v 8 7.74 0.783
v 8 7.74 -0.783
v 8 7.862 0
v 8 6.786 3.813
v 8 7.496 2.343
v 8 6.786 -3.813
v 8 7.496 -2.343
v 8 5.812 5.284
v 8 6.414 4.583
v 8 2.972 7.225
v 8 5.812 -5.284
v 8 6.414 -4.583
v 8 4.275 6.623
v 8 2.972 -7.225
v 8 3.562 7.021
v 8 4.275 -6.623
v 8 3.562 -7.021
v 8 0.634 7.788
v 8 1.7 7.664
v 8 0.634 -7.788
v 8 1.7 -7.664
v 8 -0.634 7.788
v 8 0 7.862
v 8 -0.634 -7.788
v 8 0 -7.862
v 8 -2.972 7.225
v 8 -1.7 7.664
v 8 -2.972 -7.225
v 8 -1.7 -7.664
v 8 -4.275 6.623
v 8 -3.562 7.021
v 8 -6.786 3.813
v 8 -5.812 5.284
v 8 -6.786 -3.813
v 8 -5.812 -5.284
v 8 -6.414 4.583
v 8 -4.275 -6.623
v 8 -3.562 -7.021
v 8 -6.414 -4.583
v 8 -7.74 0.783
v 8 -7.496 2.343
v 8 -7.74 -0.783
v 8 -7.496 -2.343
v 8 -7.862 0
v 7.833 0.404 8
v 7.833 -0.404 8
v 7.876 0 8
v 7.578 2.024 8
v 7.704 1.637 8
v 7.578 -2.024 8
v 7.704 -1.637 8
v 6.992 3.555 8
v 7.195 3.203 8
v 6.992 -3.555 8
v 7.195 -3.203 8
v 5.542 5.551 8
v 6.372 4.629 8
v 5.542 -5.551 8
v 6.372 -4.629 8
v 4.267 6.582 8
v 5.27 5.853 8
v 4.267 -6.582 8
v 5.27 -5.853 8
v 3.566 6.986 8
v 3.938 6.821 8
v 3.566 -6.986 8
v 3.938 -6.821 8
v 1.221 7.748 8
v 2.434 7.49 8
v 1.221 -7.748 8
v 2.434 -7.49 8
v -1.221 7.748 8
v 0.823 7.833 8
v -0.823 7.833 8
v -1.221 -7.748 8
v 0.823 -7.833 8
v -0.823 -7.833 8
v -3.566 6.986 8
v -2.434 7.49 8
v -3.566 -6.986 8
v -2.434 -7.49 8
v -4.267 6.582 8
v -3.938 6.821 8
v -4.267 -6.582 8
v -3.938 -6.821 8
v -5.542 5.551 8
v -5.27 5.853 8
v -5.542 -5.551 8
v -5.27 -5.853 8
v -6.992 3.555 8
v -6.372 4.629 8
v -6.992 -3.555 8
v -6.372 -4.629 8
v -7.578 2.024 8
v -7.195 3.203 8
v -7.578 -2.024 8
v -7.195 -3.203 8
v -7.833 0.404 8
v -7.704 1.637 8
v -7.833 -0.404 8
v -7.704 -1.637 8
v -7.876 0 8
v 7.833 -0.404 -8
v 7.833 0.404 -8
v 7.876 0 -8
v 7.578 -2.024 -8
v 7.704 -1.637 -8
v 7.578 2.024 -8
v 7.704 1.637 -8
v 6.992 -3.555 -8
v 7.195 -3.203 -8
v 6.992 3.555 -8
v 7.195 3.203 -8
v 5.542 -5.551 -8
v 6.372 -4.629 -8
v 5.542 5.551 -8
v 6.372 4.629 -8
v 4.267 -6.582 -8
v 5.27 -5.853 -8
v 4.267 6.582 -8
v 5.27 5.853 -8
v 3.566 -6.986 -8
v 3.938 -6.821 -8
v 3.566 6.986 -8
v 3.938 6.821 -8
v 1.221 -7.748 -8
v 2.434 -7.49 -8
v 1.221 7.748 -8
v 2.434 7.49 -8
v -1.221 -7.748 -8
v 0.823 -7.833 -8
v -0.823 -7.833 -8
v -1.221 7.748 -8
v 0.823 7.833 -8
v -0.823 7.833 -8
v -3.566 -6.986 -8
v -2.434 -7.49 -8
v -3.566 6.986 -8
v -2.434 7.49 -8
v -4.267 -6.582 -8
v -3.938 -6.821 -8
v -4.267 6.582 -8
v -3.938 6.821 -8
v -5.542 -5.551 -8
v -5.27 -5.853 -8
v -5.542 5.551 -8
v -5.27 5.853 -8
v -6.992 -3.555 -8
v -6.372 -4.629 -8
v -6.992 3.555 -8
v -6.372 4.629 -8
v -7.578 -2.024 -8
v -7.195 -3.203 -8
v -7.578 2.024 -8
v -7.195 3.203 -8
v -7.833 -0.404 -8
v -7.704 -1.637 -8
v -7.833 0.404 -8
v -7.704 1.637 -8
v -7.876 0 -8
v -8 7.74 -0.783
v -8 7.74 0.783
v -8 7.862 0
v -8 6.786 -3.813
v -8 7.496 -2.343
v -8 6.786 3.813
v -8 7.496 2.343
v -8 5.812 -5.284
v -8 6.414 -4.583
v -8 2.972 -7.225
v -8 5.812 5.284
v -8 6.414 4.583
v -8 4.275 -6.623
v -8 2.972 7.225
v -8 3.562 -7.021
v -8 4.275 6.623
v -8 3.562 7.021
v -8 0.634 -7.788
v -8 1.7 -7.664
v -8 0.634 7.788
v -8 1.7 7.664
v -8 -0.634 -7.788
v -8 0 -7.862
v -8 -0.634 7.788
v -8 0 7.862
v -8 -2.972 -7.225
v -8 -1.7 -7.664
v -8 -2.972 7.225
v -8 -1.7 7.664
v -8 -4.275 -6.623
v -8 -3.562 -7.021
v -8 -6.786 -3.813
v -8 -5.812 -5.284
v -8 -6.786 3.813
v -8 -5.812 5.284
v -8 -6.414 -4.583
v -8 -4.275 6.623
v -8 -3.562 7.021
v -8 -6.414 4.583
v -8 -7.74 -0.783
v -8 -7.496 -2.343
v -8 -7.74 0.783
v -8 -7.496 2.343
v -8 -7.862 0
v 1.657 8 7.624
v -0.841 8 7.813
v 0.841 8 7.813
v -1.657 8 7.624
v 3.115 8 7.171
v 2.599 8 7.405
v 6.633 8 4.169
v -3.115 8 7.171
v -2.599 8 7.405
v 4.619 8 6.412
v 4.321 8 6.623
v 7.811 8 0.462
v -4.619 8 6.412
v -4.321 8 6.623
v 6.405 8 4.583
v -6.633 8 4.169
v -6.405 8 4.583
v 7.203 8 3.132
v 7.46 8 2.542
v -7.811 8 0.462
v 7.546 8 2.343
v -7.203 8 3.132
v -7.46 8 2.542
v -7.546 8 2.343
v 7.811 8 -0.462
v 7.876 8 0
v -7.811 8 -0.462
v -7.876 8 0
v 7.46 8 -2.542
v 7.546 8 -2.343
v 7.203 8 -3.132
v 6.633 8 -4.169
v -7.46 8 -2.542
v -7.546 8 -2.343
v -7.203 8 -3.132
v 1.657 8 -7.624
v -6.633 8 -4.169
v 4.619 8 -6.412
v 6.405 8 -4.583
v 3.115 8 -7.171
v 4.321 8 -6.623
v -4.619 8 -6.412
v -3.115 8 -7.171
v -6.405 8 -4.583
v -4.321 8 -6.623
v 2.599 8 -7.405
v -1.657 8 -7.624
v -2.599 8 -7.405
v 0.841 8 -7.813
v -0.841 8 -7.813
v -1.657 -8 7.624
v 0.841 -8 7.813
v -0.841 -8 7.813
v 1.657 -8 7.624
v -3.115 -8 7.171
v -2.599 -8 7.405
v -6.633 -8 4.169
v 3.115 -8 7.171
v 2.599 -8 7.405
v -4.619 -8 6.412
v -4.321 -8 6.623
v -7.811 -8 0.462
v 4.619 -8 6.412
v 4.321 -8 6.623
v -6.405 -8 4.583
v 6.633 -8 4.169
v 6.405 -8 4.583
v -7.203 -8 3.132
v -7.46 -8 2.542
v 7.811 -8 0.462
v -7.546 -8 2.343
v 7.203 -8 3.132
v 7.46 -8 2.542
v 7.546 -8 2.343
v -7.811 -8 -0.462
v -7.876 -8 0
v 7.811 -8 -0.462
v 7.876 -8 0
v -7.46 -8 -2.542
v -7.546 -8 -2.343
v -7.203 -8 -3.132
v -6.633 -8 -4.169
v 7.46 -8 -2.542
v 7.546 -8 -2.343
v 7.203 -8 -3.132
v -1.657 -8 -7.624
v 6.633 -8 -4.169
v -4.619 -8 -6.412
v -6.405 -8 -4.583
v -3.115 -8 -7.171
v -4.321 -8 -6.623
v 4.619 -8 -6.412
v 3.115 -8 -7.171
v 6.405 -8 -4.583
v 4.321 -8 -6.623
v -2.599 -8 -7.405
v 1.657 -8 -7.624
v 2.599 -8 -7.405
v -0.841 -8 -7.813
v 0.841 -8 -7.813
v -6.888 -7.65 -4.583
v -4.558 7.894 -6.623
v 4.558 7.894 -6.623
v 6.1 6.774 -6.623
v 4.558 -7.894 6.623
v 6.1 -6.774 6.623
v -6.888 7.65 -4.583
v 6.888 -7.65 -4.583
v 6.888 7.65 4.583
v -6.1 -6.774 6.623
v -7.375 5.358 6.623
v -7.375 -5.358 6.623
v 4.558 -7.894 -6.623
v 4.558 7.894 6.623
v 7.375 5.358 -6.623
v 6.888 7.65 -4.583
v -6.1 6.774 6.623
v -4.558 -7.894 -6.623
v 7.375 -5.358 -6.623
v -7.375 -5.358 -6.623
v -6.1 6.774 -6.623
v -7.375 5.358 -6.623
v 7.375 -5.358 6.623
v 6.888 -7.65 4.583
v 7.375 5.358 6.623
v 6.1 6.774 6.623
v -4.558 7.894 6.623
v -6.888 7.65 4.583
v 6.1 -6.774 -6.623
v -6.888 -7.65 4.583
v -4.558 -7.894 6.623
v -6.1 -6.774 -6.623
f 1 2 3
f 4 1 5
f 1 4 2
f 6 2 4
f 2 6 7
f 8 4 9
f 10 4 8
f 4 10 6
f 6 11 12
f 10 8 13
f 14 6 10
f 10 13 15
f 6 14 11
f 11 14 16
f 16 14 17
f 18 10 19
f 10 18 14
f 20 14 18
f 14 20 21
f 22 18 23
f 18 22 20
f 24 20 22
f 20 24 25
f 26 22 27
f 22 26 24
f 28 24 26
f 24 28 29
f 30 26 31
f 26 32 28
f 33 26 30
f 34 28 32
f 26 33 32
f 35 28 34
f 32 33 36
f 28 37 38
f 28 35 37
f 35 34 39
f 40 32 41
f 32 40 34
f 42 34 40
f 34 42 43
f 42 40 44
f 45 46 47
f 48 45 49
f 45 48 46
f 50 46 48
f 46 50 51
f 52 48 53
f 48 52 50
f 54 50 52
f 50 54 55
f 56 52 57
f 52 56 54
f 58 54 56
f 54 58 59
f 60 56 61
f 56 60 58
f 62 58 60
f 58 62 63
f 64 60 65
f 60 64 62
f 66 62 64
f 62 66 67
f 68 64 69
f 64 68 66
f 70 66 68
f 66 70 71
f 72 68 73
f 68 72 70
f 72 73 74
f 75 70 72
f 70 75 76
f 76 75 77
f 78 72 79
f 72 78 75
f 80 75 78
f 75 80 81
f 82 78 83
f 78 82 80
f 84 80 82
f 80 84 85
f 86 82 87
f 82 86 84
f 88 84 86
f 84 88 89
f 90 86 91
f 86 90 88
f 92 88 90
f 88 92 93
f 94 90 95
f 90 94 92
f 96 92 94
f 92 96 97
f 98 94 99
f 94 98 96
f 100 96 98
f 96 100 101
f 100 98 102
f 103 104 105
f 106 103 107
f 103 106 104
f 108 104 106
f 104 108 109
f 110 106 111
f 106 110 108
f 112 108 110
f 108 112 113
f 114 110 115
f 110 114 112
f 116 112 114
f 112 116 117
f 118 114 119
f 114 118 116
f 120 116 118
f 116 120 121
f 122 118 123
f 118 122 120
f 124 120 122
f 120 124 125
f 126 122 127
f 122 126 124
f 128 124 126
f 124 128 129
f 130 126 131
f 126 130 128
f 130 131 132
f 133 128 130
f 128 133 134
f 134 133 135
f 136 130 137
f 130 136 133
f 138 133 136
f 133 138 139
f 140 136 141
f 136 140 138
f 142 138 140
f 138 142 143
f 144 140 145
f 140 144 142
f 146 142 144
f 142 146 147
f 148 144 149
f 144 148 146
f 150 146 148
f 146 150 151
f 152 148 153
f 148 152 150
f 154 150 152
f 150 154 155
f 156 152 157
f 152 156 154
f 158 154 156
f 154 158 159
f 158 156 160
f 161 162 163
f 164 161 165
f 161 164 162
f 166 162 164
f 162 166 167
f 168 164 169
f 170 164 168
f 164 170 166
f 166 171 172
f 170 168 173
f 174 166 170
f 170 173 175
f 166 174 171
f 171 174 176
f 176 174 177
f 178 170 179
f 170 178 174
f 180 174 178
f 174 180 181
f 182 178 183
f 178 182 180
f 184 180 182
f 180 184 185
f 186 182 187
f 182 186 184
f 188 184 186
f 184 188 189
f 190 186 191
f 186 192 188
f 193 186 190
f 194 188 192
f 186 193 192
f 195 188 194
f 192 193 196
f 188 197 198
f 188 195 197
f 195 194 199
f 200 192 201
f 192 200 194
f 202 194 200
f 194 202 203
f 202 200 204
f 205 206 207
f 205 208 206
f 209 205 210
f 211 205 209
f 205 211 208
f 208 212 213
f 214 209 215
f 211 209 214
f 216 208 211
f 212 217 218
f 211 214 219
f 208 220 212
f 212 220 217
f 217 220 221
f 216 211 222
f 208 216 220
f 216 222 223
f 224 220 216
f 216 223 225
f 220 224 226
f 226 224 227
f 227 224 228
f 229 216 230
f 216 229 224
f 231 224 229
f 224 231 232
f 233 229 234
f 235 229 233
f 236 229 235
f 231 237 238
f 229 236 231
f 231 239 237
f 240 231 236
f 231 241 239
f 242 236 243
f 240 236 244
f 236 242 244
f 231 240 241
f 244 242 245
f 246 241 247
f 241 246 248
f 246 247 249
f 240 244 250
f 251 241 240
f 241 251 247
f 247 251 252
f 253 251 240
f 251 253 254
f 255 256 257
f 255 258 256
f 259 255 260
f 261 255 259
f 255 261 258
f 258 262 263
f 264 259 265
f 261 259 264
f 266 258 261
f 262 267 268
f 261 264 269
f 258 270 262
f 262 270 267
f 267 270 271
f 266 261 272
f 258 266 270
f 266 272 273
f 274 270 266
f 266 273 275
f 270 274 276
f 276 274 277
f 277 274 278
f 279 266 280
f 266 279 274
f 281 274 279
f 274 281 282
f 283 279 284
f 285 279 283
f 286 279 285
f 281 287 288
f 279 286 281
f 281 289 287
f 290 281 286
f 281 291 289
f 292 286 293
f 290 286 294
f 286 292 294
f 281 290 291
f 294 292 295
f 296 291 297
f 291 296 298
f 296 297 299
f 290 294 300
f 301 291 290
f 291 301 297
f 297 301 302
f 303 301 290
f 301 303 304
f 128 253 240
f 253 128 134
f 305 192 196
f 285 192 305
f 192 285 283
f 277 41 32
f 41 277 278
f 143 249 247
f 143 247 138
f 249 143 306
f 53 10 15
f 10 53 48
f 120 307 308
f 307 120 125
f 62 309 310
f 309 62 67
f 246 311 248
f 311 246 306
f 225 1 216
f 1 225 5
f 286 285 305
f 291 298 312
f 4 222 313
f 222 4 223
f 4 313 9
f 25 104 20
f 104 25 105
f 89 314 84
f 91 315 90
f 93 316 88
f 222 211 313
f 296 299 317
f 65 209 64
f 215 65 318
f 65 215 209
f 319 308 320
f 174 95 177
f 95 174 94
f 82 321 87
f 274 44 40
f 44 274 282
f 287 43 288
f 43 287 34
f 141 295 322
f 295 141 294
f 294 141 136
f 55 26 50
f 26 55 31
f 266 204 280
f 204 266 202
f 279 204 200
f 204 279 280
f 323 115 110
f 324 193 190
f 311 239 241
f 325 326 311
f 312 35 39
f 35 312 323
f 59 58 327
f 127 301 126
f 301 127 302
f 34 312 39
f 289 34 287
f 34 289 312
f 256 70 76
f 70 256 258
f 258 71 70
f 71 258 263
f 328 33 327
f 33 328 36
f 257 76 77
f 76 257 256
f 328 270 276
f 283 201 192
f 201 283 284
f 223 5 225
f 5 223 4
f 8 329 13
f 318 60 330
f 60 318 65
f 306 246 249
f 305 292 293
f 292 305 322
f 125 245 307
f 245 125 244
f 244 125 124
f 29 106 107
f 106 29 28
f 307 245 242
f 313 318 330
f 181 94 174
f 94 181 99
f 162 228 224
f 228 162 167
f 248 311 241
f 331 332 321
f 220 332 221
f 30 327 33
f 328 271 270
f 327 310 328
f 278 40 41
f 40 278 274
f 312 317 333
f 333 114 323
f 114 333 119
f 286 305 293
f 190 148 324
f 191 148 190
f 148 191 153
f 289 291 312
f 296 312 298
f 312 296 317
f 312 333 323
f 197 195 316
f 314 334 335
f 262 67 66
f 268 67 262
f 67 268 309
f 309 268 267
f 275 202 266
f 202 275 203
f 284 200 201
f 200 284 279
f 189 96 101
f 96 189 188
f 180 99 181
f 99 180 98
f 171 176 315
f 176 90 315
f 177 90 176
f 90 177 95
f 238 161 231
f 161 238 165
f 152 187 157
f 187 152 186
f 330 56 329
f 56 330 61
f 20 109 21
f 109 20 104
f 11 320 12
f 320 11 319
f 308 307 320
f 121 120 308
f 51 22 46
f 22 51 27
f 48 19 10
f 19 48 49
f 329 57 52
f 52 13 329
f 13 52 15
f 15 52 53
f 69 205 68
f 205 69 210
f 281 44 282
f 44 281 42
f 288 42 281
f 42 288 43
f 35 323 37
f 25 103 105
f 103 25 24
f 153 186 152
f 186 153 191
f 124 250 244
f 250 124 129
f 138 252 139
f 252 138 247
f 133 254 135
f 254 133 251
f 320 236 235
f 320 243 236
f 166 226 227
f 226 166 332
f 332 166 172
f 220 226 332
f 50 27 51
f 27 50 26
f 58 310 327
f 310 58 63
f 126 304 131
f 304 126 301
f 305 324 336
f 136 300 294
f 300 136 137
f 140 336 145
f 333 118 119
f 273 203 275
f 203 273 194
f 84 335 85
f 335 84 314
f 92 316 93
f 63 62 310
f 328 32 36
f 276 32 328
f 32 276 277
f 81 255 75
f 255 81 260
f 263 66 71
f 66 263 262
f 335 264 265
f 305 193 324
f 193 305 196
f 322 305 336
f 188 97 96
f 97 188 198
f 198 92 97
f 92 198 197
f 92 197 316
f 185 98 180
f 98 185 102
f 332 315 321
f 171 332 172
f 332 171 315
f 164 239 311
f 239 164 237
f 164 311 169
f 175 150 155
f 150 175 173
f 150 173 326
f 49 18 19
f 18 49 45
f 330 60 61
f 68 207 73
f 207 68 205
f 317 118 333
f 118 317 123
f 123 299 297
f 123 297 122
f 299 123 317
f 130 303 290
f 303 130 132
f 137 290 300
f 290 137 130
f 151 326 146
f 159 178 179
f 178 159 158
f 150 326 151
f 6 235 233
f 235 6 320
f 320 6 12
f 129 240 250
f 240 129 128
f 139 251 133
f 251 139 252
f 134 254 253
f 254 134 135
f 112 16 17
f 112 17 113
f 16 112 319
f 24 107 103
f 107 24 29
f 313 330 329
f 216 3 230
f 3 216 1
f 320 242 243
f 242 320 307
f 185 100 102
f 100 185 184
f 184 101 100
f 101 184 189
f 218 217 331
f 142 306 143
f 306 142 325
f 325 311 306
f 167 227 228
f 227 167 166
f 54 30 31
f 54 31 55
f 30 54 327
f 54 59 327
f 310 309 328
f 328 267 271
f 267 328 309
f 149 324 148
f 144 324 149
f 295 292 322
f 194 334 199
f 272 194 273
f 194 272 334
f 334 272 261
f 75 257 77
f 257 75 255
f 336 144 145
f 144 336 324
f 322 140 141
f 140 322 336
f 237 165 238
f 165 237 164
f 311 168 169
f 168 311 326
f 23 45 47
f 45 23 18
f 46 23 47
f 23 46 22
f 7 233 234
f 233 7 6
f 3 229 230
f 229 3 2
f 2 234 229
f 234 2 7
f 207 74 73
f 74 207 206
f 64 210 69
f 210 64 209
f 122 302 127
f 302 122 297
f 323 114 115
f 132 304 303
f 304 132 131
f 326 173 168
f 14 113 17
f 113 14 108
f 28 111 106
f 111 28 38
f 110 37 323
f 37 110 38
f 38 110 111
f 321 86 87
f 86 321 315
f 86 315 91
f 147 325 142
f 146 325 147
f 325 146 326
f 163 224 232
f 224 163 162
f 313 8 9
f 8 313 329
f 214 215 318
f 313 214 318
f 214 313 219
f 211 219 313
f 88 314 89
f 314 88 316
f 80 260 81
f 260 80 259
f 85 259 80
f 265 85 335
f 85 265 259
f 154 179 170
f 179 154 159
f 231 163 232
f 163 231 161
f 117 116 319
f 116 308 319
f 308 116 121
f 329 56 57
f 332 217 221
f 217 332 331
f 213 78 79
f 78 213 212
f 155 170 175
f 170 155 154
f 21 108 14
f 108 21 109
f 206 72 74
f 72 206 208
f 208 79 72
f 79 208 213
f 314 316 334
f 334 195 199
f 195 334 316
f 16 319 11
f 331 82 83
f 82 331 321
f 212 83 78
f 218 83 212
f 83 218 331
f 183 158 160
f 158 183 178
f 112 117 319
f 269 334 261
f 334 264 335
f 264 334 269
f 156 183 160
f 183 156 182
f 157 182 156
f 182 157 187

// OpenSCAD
//Created by Ari M. Diacou, August 2013
//Shared under Creative Commons License: Attribution-ShareAlike 3.0 Unported (CC BY-SA 3.0) 
//see http://creativecommons.org/licenses/by-sa/3.0/

/*To get this to work offline, any image must be converted to a .dat file using the tool at http://customizer.makerbot.com/image_surface. That will output an array of values from 0-1 corresponding to the greyscale values 0-255 of the image. Inverting the colors of the image will ensure that the recessed image gets subracted from other objects properly. Copy the arry to a text file. IMPORTANT: be sure that your file is actually a dat file and not e.g. foo.dat.txt. Some operating systems (like Windows 7 by default) hide the actual extension. Once the dat files are in the same directory as the .scad file, and are named properly the surface() function should work.

The way I prepared my image files was to:
	1	Import the image into gimp.
	2	Crop the image as tightly as possible
	3	Right click on the image: Image>Scale Image
	4	With the aspect ratio locked, change the Higher of the width and height to 100 pixils.
	5	Right click on the image: Image>Canvas Size
	6	With the aspect ratio UNlocked, change the Lower of the width and height to 100 pixils. Click "Center". Click "Resize".
	7	Right click on the image: Colors>Brightness-Contrast
	8	Increase the contrast to remove the effects of the resize, and get sharper edges.
	9	Export the file to jpg/gif/bmp/png (it doesnt really matter as long as the customizer tool can read the file).
	10	Open  http://customizer.makerbot.com/image_surface in a web browser.
	11	Select the file you want to convert. Click "Invert Colors".
	12	Copy the array of numbers to a text file. 
	13	File>Save As. In the drop-down menu "Save as type:" select "All files". This will allow you to actually set the extenstion to ".dat". Name the file <whatever>.dat.
	
Your image should now ceate a surface() as intended. */


/* [Images] */
// Load a 100x100 pixel image for side 1. (images will be automatically stretched to fit) Simple, high contrast images like logos work best.
i1 = "skull.dat"; // [image_surface:100x100]
// Load a 100x100 pixel image for side 2. (images will be automatically stretched to fit) Simple, high contrast images like logos work best.
i2= "skull.dat"; // [image_surface:100x100]
// Load a 100x100 pixel image for side 3. (images will be automatically stretched to fit) Simple, high contrast images like logos work best.
i3= "skull.dat"; // [image_surface:100x100]
// Load a 100x100 pixel image for side 4. (images will be automatically stretched to fit) Simple, high contrast images like logos work best.
i4= "wshield.dat"; // [image_surface:100x100]
// Load a 100x100 pixel image for side 5. (images will be automatically stretched to fit) Simple, high contrast images like logos work best.
i5= "wshield.dat"; // [image_surface:100x100]
// Load a 100x100 pixel image for side 6. (images will be automatically stretched to fit) Simple, high contrast images like logos work best.
i6= "bshield.dat"; // [image_surface:100x100]
//What was the largest number of pixils in the image?
pixils=100;

/* [Dimensions] */
//Depth of indendations in mm
depth=.5;
//One side of the cube in mm
cube_size=16;
//How big should your image be in mm?
image_size=12;
//How much of the corners should be cut off? Higher is more spherical, 1 is a cube. Recommend 1.0-2.0.
curvature=1.42;

/* [Hidden] */
image=[i1,i2,i3,i4,i5,i6];
//How each die surface is rotated
rot=[[0,0,0],[90,0,0],[180,0,0],[270,0,0],[0,90,0],[0,-90,0]];
intersection(){ //Each side is a cube minus the image, the die is the intersection of all the cubes
	sphere(cube_size/curvature);
	side(1); //Interestingly, if you call "for(i=[1:6]){side(i);}" instead here, it won't work.
	side(2);
	side(3);
	side(4);
	side(5);
	side(6);
	}
module side(side_num){
//this function takes the surface, scales it to the right size then subtracts the surface from the cube. The resulting cube is then rotated into the correct position.
	rotate(rot[side_num-1])	
		difference(){
			cube(cube_size,true);
			translate([0,0,cube_size/2]) 
				scale([image_size/pixils,image_size/pixils,-depth]) 
					surface(file=image[side_num-1], center=true, convexity=10);
			}
	}
